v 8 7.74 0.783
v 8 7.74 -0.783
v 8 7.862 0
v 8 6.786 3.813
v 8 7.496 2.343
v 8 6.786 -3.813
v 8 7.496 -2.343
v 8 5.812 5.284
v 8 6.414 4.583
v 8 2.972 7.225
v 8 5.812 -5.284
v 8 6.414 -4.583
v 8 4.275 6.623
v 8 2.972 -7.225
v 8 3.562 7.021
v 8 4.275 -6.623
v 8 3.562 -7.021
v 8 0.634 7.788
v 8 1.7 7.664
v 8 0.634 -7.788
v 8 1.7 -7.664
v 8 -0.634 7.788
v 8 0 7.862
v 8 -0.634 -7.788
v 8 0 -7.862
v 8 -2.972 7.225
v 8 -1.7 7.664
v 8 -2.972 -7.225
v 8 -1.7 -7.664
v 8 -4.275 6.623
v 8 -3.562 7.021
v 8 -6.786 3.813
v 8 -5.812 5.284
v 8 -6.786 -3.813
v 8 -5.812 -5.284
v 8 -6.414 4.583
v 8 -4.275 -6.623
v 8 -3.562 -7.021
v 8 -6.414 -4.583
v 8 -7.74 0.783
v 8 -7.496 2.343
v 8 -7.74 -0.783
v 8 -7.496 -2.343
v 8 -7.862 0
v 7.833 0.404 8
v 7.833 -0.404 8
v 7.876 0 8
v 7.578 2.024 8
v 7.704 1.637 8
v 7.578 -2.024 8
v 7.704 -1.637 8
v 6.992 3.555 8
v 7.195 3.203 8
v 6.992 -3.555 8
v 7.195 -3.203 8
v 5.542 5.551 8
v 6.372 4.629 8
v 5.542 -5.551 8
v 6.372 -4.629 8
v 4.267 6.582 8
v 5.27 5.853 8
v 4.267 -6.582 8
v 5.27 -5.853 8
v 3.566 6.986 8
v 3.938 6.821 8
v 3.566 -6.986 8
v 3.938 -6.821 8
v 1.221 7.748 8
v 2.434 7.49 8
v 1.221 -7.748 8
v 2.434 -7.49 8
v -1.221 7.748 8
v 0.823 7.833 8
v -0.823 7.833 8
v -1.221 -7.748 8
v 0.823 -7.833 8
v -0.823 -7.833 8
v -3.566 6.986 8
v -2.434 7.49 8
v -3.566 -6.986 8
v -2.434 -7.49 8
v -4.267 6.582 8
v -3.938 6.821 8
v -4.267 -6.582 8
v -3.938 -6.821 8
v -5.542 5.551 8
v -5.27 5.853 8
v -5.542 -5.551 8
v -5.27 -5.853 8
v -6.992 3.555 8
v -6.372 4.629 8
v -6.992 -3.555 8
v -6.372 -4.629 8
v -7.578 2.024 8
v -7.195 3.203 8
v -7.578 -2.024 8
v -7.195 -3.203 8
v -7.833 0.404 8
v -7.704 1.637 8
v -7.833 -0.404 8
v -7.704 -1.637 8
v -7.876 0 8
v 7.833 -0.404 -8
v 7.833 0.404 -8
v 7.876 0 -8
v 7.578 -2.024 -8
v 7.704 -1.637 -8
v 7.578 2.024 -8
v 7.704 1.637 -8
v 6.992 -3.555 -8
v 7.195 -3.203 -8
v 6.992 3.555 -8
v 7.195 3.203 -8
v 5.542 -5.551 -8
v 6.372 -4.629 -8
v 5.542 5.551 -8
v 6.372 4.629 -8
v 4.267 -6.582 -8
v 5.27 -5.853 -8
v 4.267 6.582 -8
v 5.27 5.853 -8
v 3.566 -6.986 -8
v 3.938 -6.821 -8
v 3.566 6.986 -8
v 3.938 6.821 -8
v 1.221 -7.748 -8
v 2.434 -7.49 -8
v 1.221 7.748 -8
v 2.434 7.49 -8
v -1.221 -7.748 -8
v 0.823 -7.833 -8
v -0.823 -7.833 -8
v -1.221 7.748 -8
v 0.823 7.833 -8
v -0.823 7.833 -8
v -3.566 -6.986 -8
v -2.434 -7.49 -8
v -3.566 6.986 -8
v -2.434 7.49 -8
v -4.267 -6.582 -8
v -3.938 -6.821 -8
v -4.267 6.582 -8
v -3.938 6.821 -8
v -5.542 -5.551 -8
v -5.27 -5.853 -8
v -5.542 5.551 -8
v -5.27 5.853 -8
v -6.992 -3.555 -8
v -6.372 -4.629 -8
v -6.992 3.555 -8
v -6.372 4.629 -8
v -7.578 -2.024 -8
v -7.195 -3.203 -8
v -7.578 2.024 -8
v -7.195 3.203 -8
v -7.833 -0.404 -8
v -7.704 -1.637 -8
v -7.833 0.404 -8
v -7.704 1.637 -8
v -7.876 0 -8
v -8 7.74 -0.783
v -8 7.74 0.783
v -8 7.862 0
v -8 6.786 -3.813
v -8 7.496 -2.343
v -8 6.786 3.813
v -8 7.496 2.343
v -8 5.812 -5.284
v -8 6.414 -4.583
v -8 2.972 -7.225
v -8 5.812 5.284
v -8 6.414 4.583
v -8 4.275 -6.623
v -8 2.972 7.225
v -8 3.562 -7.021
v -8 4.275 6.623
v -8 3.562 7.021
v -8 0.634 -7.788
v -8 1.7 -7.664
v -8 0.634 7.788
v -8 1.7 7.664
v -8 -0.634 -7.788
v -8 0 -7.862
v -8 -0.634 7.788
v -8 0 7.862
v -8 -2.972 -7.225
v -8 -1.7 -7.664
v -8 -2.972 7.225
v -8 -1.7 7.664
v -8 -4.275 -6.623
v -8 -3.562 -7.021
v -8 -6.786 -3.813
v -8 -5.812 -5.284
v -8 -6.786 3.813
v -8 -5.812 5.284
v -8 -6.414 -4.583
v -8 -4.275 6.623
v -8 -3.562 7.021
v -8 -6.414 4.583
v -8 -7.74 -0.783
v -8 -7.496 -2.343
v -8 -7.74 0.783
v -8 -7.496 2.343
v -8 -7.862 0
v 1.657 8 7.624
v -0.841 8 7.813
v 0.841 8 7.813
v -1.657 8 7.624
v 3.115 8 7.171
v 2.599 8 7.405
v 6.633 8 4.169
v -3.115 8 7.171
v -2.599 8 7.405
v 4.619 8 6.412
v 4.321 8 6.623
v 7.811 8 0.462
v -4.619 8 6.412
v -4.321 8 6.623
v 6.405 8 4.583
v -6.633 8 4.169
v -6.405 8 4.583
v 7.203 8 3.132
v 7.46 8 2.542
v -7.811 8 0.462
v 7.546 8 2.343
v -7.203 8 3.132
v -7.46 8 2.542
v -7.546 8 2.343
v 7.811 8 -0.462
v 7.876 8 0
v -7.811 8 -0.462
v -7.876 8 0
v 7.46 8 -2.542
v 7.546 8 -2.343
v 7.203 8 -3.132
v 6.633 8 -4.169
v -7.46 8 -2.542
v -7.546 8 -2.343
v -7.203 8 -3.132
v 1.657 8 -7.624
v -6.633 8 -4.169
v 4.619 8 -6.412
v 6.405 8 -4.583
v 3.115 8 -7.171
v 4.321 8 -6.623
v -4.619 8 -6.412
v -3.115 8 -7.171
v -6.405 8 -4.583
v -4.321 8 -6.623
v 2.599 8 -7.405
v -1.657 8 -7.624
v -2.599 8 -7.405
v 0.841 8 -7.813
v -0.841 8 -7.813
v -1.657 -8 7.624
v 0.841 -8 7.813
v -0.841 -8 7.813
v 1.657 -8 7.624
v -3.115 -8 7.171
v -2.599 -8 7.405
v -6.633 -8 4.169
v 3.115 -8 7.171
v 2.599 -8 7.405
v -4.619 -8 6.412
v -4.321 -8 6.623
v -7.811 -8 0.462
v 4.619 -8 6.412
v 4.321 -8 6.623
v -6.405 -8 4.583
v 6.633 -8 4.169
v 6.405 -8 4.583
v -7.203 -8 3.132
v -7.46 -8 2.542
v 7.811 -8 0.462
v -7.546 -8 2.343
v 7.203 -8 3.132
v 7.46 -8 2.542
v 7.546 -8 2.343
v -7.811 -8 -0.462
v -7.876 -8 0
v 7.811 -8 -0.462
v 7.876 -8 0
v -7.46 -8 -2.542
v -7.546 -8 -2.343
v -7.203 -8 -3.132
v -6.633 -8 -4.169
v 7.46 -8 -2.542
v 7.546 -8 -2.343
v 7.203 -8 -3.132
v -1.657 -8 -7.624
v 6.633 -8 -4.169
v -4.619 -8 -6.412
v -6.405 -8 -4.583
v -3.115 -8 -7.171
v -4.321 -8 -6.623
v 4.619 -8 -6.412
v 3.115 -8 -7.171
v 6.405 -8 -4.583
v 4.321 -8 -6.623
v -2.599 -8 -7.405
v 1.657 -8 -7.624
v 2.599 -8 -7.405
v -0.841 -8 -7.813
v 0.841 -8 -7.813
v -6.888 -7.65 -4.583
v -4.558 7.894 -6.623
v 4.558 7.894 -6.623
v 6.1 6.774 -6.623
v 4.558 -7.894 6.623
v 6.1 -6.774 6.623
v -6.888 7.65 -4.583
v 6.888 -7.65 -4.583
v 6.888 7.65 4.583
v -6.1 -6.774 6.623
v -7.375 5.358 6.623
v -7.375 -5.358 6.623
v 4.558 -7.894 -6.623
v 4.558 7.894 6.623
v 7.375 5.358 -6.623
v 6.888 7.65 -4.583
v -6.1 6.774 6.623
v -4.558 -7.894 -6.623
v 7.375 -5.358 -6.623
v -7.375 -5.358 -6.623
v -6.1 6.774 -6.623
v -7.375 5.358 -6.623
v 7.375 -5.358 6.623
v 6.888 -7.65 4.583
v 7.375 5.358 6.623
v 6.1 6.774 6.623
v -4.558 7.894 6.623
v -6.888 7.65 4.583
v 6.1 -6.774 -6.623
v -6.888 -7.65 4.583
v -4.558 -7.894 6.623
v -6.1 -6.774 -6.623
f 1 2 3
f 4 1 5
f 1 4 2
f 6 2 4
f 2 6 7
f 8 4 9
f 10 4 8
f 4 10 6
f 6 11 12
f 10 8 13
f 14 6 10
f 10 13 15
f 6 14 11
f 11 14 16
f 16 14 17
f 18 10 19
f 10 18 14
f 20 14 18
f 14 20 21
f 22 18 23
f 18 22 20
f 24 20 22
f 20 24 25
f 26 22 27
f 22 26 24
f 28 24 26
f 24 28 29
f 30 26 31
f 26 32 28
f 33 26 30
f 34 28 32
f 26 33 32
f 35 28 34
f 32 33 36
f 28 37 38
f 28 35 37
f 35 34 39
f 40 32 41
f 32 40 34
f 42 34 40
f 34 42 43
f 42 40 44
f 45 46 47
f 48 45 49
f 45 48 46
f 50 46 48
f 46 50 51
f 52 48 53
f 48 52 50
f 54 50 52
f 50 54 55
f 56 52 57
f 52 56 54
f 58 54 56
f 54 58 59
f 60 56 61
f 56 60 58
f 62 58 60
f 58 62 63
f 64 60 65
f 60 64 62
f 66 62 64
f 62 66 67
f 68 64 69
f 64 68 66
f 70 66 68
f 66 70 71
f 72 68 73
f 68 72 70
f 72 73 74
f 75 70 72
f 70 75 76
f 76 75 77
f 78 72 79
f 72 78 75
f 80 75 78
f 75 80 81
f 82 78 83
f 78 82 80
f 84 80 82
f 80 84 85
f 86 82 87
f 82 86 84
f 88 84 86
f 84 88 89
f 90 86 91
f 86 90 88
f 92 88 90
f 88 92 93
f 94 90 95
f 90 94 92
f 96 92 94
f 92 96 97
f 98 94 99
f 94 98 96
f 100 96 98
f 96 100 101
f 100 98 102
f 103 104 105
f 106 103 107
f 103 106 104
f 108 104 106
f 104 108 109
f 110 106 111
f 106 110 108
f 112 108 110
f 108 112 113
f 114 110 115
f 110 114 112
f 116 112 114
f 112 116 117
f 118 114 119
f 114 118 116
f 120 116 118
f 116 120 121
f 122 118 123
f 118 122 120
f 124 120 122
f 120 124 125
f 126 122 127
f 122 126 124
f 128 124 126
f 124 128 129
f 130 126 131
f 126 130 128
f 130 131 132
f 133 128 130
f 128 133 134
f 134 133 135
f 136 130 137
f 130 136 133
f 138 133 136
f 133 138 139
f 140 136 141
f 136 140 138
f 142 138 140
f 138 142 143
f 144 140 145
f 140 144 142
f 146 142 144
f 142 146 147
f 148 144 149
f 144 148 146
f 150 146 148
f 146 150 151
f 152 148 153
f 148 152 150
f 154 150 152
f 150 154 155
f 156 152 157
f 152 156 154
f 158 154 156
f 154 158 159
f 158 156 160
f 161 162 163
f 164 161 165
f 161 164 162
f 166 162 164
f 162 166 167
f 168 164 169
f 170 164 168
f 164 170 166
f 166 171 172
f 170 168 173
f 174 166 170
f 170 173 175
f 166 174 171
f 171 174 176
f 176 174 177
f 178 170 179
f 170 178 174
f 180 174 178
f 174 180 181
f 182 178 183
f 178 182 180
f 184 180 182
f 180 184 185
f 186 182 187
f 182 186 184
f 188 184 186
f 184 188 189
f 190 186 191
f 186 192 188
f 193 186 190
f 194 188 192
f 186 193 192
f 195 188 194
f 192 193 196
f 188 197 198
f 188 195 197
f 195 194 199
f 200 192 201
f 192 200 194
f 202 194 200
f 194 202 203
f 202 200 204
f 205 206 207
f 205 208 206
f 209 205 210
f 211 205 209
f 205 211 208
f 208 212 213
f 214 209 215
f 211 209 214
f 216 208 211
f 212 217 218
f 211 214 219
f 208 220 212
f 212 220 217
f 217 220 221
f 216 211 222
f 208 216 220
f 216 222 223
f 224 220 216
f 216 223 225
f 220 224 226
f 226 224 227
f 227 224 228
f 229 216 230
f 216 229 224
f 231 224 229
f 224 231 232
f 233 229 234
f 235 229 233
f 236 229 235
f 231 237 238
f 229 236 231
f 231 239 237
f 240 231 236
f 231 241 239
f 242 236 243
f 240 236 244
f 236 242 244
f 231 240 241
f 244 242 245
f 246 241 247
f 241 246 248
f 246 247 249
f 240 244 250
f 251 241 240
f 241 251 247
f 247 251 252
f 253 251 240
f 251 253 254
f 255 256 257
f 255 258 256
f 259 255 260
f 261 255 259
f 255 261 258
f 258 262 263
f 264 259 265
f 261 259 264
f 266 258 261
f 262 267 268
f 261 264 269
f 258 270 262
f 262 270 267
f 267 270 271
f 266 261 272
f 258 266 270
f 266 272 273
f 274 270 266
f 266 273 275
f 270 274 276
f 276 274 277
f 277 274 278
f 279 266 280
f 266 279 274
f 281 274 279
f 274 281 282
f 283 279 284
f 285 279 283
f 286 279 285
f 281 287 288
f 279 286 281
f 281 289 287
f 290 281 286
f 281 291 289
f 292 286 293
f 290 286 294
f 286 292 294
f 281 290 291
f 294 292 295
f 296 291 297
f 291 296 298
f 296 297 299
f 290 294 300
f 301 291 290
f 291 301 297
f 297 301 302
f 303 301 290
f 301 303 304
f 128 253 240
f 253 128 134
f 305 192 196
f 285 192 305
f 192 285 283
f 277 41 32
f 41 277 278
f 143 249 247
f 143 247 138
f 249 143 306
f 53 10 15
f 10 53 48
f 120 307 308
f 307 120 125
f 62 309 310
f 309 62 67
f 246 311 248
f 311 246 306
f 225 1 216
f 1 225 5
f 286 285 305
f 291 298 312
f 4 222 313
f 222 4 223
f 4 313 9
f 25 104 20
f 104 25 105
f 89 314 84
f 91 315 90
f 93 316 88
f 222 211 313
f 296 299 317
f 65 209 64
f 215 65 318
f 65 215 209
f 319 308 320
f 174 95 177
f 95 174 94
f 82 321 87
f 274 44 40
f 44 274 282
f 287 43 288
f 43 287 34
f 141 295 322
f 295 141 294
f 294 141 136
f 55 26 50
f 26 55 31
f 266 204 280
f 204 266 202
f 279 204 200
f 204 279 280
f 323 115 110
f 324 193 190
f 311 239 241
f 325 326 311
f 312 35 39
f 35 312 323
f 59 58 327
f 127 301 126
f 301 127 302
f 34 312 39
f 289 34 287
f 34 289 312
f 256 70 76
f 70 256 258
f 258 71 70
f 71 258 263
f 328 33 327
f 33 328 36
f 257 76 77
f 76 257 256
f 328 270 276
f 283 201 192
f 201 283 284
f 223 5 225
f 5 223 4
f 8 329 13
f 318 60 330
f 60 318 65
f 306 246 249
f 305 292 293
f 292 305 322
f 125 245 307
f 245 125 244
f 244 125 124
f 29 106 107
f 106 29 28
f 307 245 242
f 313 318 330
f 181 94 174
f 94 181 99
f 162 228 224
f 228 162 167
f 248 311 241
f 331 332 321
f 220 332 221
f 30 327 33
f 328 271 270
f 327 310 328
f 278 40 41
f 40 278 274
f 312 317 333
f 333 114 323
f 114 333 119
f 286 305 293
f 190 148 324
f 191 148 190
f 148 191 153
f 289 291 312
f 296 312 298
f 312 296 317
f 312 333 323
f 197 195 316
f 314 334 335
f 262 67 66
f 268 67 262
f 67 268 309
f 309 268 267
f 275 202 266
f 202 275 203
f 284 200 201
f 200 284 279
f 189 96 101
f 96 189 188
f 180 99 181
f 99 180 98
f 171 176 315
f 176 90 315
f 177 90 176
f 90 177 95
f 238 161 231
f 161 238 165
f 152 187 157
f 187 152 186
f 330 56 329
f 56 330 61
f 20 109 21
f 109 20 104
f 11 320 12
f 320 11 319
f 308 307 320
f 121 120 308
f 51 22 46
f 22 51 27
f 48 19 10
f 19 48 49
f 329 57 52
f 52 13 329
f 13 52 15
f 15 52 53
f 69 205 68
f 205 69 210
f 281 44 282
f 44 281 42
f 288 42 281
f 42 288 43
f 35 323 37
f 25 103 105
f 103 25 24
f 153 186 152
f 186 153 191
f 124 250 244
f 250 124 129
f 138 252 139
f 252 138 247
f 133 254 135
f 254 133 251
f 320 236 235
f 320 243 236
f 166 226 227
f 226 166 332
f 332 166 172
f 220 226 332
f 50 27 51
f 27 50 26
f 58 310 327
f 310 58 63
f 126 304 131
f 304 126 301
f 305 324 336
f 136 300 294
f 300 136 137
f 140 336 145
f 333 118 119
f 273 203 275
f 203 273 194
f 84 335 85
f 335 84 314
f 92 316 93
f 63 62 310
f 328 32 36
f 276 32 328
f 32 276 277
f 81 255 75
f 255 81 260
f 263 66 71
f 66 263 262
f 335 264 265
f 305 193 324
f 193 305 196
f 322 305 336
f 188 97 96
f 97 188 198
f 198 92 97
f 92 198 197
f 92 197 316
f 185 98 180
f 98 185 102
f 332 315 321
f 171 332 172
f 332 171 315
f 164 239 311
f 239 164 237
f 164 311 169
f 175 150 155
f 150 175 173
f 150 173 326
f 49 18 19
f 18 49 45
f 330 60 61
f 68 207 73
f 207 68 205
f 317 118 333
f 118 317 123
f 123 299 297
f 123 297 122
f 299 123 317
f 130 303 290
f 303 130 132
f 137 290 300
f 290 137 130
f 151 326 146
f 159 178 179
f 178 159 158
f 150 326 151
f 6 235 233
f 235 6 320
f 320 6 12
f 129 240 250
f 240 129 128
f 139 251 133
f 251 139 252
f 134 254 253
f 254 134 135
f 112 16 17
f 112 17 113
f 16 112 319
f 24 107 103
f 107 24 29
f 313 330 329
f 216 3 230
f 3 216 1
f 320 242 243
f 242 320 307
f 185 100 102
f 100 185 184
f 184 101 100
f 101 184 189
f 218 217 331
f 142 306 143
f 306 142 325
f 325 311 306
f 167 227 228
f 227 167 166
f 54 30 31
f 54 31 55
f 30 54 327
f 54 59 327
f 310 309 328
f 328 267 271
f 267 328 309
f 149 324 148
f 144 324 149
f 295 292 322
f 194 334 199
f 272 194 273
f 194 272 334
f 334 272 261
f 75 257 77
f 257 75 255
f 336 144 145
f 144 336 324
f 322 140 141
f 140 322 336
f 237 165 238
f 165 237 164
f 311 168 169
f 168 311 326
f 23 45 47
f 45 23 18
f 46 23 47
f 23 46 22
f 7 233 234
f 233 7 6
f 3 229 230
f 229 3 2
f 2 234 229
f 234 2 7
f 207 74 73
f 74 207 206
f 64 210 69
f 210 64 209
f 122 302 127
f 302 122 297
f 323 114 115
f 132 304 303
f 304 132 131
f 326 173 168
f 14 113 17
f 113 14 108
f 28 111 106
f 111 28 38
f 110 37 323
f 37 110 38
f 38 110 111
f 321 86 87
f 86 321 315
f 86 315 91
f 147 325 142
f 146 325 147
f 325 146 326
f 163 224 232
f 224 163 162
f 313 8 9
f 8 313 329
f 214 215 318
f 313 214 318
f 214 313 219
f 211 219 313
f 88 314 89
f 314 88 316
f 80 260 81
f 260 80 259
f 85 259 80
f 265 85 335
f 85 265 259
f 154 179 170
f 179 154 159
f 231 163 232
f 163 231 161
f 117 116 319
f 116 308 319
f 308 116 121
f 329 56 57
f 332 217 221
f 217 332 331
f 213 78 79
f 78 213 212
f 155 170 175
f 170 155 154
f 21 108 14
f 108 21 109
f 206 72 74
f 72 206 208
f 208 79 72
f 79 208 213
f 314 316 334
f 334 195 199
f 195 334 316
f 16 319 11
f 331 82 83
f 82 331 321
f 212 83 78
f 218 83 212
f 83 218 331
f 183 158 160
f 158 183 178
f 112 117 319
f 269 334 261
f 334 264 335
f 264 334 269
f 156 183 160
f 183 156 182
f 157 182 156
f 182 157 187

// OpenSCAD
//Created by Ari M. Diacou, August 2013
//Shared under Creative Commons License: Attribution-ShareAlike 3.0 Unported (CC BY-SA 3.0) 
//see http://creativecommons.org/licenses/by-sa/3.0/

/*To get this to work offline, any image must be converted to a .dat file using the tool at http://customizer.makerbot.com/image_surface. That will output an array of values from 0-1 corresponding to the greyscale values 0-255 of the image. Inverting the colors of the image will ensure that the recessed image gets subracted from other objects properly. Copy the arry to a text file. IMPORTANT: be sure that your file is actually a dat file and not e.g. foo.dat.txt. Some operating systems (like Windows 7 by default) hide the actual extension. Once the dat files are in the same directory as the .scad file, and are named properly the surface() function should work.

The way I prepared my image files was to:
	1	Import the image into gimp.
	2	Crop the image as tightly as possible
	3	Right click on the image: Image>Scale Image
	4	With the aspect ratio locked, change the Higher of the width and height to 100 pixils.
	5	Right click on the image: Image>Canvas Size
	6	With the aspect ratio UNlocked, change the Lower of the width and height to 100 pixils. Click "Center". Click "Resize".
	7	Right click on the image: Colors>Brightness-Contrast
	8	Increase the contrast to remove the effects of the resize, and get sharper edges.
	9	Export the file to jpg/gif/bmp/png (it doesnt really matter as long as the customizer tool can read the file).
	10	Open  http://customizer.makerbot.com/image_surface in a web browser.
	11	Select the file you want to convert. Click "Invert Colors".
	12	Copy the array of numbers to a text file. 
	13	File>Save As. In the drop-down menu "Save as type:" select "All files". This will allow you to actually set the extenstion to ".dat". Name the file <whatever>.dat.
	
Your image should now ceate a surface() as intended. */


/* [Images] */
// Load a 100x100 pixel image for side 1. (images will be automatically stretched to fit) Simple, high contrast images like logos work best.
i1 = "skull.dat"; // [image_surface:100x100]
// Load a 100x100 pixel image for side 2. (images will be automatically stretched to fit) Simple, high contrast images like logos work best.
i2= "skull.dat"; // [image_surface:100x100]
// Load a 100x100 pixel image for side 3. (images will be automatically stretched to fit) Simple, high contrast images like logos work best.
i3= "skull.dat"; // [image_surface:100x100]
// Load a 100x100 pixel image for side 4. (images will be automatically stretched to fit) Simple, high contrast images like logos work best.
i4= "wshield.dat"; // [image_surface:100x100]
// Load a 100x100 pixel image for side 5. (images will be automatically stretched to fit) Simple, high contrast images like logos work best.
i5= "wshield.dat"; // [image_surface:100x100]
// Load a 100x100 pixel image for side 6. (images will be automatically stretched to fit) Simple, high contrast images like logos work best.
i6= "bshield.dat"; // [image_surface:100x100]
//What was the largest number of pixils in the image?
pixils=100;

/* [Dimensions] */
//Depth of indendations in mm
depth=.5;
//One side of the cube in mm
cube_size=16;
//How big should your image be in mm?
image_size=12;
//How much of the corners should be cut off? Higher is more spherical, 1 is a cube. Recommend 1.0-2.0.
curvature=1.42;

/* [Hidden] */
image=[i1,i2,i3,i4,i5,i6];
//How each die surface is rotated
rot=[[0,0,0],[90,0,0],[180,0,0],[270,0,0],[0,90,0],[0,-90,0]];
intersection(){ //Each side is a cube minus the image, the die is the intersection of all the cubes
	sphere(cube_size/curvature);
	side(1); //Interestingly, if you call "for(i=[1:6]){side(i);}" instead here, it won't work.
	side(2);
	side(3);
	side(4);
	side(5);
	side(6);
	}
module side(side_num){
//this function takes the surface, scales it to the right size then subtracts the surface from the cube. The resulting cube is then rotated into the correct position.
	rotate(rot[side_num-1])	
		difference(){
			cube(cube_size,true);
			translate([0,0,cube_size/2]) 
				scale([image_size/pixils,image_size/pixils,-depth]) 
					surface(file=image[side_num-1], center=true, convexity=10);
			}
	}
